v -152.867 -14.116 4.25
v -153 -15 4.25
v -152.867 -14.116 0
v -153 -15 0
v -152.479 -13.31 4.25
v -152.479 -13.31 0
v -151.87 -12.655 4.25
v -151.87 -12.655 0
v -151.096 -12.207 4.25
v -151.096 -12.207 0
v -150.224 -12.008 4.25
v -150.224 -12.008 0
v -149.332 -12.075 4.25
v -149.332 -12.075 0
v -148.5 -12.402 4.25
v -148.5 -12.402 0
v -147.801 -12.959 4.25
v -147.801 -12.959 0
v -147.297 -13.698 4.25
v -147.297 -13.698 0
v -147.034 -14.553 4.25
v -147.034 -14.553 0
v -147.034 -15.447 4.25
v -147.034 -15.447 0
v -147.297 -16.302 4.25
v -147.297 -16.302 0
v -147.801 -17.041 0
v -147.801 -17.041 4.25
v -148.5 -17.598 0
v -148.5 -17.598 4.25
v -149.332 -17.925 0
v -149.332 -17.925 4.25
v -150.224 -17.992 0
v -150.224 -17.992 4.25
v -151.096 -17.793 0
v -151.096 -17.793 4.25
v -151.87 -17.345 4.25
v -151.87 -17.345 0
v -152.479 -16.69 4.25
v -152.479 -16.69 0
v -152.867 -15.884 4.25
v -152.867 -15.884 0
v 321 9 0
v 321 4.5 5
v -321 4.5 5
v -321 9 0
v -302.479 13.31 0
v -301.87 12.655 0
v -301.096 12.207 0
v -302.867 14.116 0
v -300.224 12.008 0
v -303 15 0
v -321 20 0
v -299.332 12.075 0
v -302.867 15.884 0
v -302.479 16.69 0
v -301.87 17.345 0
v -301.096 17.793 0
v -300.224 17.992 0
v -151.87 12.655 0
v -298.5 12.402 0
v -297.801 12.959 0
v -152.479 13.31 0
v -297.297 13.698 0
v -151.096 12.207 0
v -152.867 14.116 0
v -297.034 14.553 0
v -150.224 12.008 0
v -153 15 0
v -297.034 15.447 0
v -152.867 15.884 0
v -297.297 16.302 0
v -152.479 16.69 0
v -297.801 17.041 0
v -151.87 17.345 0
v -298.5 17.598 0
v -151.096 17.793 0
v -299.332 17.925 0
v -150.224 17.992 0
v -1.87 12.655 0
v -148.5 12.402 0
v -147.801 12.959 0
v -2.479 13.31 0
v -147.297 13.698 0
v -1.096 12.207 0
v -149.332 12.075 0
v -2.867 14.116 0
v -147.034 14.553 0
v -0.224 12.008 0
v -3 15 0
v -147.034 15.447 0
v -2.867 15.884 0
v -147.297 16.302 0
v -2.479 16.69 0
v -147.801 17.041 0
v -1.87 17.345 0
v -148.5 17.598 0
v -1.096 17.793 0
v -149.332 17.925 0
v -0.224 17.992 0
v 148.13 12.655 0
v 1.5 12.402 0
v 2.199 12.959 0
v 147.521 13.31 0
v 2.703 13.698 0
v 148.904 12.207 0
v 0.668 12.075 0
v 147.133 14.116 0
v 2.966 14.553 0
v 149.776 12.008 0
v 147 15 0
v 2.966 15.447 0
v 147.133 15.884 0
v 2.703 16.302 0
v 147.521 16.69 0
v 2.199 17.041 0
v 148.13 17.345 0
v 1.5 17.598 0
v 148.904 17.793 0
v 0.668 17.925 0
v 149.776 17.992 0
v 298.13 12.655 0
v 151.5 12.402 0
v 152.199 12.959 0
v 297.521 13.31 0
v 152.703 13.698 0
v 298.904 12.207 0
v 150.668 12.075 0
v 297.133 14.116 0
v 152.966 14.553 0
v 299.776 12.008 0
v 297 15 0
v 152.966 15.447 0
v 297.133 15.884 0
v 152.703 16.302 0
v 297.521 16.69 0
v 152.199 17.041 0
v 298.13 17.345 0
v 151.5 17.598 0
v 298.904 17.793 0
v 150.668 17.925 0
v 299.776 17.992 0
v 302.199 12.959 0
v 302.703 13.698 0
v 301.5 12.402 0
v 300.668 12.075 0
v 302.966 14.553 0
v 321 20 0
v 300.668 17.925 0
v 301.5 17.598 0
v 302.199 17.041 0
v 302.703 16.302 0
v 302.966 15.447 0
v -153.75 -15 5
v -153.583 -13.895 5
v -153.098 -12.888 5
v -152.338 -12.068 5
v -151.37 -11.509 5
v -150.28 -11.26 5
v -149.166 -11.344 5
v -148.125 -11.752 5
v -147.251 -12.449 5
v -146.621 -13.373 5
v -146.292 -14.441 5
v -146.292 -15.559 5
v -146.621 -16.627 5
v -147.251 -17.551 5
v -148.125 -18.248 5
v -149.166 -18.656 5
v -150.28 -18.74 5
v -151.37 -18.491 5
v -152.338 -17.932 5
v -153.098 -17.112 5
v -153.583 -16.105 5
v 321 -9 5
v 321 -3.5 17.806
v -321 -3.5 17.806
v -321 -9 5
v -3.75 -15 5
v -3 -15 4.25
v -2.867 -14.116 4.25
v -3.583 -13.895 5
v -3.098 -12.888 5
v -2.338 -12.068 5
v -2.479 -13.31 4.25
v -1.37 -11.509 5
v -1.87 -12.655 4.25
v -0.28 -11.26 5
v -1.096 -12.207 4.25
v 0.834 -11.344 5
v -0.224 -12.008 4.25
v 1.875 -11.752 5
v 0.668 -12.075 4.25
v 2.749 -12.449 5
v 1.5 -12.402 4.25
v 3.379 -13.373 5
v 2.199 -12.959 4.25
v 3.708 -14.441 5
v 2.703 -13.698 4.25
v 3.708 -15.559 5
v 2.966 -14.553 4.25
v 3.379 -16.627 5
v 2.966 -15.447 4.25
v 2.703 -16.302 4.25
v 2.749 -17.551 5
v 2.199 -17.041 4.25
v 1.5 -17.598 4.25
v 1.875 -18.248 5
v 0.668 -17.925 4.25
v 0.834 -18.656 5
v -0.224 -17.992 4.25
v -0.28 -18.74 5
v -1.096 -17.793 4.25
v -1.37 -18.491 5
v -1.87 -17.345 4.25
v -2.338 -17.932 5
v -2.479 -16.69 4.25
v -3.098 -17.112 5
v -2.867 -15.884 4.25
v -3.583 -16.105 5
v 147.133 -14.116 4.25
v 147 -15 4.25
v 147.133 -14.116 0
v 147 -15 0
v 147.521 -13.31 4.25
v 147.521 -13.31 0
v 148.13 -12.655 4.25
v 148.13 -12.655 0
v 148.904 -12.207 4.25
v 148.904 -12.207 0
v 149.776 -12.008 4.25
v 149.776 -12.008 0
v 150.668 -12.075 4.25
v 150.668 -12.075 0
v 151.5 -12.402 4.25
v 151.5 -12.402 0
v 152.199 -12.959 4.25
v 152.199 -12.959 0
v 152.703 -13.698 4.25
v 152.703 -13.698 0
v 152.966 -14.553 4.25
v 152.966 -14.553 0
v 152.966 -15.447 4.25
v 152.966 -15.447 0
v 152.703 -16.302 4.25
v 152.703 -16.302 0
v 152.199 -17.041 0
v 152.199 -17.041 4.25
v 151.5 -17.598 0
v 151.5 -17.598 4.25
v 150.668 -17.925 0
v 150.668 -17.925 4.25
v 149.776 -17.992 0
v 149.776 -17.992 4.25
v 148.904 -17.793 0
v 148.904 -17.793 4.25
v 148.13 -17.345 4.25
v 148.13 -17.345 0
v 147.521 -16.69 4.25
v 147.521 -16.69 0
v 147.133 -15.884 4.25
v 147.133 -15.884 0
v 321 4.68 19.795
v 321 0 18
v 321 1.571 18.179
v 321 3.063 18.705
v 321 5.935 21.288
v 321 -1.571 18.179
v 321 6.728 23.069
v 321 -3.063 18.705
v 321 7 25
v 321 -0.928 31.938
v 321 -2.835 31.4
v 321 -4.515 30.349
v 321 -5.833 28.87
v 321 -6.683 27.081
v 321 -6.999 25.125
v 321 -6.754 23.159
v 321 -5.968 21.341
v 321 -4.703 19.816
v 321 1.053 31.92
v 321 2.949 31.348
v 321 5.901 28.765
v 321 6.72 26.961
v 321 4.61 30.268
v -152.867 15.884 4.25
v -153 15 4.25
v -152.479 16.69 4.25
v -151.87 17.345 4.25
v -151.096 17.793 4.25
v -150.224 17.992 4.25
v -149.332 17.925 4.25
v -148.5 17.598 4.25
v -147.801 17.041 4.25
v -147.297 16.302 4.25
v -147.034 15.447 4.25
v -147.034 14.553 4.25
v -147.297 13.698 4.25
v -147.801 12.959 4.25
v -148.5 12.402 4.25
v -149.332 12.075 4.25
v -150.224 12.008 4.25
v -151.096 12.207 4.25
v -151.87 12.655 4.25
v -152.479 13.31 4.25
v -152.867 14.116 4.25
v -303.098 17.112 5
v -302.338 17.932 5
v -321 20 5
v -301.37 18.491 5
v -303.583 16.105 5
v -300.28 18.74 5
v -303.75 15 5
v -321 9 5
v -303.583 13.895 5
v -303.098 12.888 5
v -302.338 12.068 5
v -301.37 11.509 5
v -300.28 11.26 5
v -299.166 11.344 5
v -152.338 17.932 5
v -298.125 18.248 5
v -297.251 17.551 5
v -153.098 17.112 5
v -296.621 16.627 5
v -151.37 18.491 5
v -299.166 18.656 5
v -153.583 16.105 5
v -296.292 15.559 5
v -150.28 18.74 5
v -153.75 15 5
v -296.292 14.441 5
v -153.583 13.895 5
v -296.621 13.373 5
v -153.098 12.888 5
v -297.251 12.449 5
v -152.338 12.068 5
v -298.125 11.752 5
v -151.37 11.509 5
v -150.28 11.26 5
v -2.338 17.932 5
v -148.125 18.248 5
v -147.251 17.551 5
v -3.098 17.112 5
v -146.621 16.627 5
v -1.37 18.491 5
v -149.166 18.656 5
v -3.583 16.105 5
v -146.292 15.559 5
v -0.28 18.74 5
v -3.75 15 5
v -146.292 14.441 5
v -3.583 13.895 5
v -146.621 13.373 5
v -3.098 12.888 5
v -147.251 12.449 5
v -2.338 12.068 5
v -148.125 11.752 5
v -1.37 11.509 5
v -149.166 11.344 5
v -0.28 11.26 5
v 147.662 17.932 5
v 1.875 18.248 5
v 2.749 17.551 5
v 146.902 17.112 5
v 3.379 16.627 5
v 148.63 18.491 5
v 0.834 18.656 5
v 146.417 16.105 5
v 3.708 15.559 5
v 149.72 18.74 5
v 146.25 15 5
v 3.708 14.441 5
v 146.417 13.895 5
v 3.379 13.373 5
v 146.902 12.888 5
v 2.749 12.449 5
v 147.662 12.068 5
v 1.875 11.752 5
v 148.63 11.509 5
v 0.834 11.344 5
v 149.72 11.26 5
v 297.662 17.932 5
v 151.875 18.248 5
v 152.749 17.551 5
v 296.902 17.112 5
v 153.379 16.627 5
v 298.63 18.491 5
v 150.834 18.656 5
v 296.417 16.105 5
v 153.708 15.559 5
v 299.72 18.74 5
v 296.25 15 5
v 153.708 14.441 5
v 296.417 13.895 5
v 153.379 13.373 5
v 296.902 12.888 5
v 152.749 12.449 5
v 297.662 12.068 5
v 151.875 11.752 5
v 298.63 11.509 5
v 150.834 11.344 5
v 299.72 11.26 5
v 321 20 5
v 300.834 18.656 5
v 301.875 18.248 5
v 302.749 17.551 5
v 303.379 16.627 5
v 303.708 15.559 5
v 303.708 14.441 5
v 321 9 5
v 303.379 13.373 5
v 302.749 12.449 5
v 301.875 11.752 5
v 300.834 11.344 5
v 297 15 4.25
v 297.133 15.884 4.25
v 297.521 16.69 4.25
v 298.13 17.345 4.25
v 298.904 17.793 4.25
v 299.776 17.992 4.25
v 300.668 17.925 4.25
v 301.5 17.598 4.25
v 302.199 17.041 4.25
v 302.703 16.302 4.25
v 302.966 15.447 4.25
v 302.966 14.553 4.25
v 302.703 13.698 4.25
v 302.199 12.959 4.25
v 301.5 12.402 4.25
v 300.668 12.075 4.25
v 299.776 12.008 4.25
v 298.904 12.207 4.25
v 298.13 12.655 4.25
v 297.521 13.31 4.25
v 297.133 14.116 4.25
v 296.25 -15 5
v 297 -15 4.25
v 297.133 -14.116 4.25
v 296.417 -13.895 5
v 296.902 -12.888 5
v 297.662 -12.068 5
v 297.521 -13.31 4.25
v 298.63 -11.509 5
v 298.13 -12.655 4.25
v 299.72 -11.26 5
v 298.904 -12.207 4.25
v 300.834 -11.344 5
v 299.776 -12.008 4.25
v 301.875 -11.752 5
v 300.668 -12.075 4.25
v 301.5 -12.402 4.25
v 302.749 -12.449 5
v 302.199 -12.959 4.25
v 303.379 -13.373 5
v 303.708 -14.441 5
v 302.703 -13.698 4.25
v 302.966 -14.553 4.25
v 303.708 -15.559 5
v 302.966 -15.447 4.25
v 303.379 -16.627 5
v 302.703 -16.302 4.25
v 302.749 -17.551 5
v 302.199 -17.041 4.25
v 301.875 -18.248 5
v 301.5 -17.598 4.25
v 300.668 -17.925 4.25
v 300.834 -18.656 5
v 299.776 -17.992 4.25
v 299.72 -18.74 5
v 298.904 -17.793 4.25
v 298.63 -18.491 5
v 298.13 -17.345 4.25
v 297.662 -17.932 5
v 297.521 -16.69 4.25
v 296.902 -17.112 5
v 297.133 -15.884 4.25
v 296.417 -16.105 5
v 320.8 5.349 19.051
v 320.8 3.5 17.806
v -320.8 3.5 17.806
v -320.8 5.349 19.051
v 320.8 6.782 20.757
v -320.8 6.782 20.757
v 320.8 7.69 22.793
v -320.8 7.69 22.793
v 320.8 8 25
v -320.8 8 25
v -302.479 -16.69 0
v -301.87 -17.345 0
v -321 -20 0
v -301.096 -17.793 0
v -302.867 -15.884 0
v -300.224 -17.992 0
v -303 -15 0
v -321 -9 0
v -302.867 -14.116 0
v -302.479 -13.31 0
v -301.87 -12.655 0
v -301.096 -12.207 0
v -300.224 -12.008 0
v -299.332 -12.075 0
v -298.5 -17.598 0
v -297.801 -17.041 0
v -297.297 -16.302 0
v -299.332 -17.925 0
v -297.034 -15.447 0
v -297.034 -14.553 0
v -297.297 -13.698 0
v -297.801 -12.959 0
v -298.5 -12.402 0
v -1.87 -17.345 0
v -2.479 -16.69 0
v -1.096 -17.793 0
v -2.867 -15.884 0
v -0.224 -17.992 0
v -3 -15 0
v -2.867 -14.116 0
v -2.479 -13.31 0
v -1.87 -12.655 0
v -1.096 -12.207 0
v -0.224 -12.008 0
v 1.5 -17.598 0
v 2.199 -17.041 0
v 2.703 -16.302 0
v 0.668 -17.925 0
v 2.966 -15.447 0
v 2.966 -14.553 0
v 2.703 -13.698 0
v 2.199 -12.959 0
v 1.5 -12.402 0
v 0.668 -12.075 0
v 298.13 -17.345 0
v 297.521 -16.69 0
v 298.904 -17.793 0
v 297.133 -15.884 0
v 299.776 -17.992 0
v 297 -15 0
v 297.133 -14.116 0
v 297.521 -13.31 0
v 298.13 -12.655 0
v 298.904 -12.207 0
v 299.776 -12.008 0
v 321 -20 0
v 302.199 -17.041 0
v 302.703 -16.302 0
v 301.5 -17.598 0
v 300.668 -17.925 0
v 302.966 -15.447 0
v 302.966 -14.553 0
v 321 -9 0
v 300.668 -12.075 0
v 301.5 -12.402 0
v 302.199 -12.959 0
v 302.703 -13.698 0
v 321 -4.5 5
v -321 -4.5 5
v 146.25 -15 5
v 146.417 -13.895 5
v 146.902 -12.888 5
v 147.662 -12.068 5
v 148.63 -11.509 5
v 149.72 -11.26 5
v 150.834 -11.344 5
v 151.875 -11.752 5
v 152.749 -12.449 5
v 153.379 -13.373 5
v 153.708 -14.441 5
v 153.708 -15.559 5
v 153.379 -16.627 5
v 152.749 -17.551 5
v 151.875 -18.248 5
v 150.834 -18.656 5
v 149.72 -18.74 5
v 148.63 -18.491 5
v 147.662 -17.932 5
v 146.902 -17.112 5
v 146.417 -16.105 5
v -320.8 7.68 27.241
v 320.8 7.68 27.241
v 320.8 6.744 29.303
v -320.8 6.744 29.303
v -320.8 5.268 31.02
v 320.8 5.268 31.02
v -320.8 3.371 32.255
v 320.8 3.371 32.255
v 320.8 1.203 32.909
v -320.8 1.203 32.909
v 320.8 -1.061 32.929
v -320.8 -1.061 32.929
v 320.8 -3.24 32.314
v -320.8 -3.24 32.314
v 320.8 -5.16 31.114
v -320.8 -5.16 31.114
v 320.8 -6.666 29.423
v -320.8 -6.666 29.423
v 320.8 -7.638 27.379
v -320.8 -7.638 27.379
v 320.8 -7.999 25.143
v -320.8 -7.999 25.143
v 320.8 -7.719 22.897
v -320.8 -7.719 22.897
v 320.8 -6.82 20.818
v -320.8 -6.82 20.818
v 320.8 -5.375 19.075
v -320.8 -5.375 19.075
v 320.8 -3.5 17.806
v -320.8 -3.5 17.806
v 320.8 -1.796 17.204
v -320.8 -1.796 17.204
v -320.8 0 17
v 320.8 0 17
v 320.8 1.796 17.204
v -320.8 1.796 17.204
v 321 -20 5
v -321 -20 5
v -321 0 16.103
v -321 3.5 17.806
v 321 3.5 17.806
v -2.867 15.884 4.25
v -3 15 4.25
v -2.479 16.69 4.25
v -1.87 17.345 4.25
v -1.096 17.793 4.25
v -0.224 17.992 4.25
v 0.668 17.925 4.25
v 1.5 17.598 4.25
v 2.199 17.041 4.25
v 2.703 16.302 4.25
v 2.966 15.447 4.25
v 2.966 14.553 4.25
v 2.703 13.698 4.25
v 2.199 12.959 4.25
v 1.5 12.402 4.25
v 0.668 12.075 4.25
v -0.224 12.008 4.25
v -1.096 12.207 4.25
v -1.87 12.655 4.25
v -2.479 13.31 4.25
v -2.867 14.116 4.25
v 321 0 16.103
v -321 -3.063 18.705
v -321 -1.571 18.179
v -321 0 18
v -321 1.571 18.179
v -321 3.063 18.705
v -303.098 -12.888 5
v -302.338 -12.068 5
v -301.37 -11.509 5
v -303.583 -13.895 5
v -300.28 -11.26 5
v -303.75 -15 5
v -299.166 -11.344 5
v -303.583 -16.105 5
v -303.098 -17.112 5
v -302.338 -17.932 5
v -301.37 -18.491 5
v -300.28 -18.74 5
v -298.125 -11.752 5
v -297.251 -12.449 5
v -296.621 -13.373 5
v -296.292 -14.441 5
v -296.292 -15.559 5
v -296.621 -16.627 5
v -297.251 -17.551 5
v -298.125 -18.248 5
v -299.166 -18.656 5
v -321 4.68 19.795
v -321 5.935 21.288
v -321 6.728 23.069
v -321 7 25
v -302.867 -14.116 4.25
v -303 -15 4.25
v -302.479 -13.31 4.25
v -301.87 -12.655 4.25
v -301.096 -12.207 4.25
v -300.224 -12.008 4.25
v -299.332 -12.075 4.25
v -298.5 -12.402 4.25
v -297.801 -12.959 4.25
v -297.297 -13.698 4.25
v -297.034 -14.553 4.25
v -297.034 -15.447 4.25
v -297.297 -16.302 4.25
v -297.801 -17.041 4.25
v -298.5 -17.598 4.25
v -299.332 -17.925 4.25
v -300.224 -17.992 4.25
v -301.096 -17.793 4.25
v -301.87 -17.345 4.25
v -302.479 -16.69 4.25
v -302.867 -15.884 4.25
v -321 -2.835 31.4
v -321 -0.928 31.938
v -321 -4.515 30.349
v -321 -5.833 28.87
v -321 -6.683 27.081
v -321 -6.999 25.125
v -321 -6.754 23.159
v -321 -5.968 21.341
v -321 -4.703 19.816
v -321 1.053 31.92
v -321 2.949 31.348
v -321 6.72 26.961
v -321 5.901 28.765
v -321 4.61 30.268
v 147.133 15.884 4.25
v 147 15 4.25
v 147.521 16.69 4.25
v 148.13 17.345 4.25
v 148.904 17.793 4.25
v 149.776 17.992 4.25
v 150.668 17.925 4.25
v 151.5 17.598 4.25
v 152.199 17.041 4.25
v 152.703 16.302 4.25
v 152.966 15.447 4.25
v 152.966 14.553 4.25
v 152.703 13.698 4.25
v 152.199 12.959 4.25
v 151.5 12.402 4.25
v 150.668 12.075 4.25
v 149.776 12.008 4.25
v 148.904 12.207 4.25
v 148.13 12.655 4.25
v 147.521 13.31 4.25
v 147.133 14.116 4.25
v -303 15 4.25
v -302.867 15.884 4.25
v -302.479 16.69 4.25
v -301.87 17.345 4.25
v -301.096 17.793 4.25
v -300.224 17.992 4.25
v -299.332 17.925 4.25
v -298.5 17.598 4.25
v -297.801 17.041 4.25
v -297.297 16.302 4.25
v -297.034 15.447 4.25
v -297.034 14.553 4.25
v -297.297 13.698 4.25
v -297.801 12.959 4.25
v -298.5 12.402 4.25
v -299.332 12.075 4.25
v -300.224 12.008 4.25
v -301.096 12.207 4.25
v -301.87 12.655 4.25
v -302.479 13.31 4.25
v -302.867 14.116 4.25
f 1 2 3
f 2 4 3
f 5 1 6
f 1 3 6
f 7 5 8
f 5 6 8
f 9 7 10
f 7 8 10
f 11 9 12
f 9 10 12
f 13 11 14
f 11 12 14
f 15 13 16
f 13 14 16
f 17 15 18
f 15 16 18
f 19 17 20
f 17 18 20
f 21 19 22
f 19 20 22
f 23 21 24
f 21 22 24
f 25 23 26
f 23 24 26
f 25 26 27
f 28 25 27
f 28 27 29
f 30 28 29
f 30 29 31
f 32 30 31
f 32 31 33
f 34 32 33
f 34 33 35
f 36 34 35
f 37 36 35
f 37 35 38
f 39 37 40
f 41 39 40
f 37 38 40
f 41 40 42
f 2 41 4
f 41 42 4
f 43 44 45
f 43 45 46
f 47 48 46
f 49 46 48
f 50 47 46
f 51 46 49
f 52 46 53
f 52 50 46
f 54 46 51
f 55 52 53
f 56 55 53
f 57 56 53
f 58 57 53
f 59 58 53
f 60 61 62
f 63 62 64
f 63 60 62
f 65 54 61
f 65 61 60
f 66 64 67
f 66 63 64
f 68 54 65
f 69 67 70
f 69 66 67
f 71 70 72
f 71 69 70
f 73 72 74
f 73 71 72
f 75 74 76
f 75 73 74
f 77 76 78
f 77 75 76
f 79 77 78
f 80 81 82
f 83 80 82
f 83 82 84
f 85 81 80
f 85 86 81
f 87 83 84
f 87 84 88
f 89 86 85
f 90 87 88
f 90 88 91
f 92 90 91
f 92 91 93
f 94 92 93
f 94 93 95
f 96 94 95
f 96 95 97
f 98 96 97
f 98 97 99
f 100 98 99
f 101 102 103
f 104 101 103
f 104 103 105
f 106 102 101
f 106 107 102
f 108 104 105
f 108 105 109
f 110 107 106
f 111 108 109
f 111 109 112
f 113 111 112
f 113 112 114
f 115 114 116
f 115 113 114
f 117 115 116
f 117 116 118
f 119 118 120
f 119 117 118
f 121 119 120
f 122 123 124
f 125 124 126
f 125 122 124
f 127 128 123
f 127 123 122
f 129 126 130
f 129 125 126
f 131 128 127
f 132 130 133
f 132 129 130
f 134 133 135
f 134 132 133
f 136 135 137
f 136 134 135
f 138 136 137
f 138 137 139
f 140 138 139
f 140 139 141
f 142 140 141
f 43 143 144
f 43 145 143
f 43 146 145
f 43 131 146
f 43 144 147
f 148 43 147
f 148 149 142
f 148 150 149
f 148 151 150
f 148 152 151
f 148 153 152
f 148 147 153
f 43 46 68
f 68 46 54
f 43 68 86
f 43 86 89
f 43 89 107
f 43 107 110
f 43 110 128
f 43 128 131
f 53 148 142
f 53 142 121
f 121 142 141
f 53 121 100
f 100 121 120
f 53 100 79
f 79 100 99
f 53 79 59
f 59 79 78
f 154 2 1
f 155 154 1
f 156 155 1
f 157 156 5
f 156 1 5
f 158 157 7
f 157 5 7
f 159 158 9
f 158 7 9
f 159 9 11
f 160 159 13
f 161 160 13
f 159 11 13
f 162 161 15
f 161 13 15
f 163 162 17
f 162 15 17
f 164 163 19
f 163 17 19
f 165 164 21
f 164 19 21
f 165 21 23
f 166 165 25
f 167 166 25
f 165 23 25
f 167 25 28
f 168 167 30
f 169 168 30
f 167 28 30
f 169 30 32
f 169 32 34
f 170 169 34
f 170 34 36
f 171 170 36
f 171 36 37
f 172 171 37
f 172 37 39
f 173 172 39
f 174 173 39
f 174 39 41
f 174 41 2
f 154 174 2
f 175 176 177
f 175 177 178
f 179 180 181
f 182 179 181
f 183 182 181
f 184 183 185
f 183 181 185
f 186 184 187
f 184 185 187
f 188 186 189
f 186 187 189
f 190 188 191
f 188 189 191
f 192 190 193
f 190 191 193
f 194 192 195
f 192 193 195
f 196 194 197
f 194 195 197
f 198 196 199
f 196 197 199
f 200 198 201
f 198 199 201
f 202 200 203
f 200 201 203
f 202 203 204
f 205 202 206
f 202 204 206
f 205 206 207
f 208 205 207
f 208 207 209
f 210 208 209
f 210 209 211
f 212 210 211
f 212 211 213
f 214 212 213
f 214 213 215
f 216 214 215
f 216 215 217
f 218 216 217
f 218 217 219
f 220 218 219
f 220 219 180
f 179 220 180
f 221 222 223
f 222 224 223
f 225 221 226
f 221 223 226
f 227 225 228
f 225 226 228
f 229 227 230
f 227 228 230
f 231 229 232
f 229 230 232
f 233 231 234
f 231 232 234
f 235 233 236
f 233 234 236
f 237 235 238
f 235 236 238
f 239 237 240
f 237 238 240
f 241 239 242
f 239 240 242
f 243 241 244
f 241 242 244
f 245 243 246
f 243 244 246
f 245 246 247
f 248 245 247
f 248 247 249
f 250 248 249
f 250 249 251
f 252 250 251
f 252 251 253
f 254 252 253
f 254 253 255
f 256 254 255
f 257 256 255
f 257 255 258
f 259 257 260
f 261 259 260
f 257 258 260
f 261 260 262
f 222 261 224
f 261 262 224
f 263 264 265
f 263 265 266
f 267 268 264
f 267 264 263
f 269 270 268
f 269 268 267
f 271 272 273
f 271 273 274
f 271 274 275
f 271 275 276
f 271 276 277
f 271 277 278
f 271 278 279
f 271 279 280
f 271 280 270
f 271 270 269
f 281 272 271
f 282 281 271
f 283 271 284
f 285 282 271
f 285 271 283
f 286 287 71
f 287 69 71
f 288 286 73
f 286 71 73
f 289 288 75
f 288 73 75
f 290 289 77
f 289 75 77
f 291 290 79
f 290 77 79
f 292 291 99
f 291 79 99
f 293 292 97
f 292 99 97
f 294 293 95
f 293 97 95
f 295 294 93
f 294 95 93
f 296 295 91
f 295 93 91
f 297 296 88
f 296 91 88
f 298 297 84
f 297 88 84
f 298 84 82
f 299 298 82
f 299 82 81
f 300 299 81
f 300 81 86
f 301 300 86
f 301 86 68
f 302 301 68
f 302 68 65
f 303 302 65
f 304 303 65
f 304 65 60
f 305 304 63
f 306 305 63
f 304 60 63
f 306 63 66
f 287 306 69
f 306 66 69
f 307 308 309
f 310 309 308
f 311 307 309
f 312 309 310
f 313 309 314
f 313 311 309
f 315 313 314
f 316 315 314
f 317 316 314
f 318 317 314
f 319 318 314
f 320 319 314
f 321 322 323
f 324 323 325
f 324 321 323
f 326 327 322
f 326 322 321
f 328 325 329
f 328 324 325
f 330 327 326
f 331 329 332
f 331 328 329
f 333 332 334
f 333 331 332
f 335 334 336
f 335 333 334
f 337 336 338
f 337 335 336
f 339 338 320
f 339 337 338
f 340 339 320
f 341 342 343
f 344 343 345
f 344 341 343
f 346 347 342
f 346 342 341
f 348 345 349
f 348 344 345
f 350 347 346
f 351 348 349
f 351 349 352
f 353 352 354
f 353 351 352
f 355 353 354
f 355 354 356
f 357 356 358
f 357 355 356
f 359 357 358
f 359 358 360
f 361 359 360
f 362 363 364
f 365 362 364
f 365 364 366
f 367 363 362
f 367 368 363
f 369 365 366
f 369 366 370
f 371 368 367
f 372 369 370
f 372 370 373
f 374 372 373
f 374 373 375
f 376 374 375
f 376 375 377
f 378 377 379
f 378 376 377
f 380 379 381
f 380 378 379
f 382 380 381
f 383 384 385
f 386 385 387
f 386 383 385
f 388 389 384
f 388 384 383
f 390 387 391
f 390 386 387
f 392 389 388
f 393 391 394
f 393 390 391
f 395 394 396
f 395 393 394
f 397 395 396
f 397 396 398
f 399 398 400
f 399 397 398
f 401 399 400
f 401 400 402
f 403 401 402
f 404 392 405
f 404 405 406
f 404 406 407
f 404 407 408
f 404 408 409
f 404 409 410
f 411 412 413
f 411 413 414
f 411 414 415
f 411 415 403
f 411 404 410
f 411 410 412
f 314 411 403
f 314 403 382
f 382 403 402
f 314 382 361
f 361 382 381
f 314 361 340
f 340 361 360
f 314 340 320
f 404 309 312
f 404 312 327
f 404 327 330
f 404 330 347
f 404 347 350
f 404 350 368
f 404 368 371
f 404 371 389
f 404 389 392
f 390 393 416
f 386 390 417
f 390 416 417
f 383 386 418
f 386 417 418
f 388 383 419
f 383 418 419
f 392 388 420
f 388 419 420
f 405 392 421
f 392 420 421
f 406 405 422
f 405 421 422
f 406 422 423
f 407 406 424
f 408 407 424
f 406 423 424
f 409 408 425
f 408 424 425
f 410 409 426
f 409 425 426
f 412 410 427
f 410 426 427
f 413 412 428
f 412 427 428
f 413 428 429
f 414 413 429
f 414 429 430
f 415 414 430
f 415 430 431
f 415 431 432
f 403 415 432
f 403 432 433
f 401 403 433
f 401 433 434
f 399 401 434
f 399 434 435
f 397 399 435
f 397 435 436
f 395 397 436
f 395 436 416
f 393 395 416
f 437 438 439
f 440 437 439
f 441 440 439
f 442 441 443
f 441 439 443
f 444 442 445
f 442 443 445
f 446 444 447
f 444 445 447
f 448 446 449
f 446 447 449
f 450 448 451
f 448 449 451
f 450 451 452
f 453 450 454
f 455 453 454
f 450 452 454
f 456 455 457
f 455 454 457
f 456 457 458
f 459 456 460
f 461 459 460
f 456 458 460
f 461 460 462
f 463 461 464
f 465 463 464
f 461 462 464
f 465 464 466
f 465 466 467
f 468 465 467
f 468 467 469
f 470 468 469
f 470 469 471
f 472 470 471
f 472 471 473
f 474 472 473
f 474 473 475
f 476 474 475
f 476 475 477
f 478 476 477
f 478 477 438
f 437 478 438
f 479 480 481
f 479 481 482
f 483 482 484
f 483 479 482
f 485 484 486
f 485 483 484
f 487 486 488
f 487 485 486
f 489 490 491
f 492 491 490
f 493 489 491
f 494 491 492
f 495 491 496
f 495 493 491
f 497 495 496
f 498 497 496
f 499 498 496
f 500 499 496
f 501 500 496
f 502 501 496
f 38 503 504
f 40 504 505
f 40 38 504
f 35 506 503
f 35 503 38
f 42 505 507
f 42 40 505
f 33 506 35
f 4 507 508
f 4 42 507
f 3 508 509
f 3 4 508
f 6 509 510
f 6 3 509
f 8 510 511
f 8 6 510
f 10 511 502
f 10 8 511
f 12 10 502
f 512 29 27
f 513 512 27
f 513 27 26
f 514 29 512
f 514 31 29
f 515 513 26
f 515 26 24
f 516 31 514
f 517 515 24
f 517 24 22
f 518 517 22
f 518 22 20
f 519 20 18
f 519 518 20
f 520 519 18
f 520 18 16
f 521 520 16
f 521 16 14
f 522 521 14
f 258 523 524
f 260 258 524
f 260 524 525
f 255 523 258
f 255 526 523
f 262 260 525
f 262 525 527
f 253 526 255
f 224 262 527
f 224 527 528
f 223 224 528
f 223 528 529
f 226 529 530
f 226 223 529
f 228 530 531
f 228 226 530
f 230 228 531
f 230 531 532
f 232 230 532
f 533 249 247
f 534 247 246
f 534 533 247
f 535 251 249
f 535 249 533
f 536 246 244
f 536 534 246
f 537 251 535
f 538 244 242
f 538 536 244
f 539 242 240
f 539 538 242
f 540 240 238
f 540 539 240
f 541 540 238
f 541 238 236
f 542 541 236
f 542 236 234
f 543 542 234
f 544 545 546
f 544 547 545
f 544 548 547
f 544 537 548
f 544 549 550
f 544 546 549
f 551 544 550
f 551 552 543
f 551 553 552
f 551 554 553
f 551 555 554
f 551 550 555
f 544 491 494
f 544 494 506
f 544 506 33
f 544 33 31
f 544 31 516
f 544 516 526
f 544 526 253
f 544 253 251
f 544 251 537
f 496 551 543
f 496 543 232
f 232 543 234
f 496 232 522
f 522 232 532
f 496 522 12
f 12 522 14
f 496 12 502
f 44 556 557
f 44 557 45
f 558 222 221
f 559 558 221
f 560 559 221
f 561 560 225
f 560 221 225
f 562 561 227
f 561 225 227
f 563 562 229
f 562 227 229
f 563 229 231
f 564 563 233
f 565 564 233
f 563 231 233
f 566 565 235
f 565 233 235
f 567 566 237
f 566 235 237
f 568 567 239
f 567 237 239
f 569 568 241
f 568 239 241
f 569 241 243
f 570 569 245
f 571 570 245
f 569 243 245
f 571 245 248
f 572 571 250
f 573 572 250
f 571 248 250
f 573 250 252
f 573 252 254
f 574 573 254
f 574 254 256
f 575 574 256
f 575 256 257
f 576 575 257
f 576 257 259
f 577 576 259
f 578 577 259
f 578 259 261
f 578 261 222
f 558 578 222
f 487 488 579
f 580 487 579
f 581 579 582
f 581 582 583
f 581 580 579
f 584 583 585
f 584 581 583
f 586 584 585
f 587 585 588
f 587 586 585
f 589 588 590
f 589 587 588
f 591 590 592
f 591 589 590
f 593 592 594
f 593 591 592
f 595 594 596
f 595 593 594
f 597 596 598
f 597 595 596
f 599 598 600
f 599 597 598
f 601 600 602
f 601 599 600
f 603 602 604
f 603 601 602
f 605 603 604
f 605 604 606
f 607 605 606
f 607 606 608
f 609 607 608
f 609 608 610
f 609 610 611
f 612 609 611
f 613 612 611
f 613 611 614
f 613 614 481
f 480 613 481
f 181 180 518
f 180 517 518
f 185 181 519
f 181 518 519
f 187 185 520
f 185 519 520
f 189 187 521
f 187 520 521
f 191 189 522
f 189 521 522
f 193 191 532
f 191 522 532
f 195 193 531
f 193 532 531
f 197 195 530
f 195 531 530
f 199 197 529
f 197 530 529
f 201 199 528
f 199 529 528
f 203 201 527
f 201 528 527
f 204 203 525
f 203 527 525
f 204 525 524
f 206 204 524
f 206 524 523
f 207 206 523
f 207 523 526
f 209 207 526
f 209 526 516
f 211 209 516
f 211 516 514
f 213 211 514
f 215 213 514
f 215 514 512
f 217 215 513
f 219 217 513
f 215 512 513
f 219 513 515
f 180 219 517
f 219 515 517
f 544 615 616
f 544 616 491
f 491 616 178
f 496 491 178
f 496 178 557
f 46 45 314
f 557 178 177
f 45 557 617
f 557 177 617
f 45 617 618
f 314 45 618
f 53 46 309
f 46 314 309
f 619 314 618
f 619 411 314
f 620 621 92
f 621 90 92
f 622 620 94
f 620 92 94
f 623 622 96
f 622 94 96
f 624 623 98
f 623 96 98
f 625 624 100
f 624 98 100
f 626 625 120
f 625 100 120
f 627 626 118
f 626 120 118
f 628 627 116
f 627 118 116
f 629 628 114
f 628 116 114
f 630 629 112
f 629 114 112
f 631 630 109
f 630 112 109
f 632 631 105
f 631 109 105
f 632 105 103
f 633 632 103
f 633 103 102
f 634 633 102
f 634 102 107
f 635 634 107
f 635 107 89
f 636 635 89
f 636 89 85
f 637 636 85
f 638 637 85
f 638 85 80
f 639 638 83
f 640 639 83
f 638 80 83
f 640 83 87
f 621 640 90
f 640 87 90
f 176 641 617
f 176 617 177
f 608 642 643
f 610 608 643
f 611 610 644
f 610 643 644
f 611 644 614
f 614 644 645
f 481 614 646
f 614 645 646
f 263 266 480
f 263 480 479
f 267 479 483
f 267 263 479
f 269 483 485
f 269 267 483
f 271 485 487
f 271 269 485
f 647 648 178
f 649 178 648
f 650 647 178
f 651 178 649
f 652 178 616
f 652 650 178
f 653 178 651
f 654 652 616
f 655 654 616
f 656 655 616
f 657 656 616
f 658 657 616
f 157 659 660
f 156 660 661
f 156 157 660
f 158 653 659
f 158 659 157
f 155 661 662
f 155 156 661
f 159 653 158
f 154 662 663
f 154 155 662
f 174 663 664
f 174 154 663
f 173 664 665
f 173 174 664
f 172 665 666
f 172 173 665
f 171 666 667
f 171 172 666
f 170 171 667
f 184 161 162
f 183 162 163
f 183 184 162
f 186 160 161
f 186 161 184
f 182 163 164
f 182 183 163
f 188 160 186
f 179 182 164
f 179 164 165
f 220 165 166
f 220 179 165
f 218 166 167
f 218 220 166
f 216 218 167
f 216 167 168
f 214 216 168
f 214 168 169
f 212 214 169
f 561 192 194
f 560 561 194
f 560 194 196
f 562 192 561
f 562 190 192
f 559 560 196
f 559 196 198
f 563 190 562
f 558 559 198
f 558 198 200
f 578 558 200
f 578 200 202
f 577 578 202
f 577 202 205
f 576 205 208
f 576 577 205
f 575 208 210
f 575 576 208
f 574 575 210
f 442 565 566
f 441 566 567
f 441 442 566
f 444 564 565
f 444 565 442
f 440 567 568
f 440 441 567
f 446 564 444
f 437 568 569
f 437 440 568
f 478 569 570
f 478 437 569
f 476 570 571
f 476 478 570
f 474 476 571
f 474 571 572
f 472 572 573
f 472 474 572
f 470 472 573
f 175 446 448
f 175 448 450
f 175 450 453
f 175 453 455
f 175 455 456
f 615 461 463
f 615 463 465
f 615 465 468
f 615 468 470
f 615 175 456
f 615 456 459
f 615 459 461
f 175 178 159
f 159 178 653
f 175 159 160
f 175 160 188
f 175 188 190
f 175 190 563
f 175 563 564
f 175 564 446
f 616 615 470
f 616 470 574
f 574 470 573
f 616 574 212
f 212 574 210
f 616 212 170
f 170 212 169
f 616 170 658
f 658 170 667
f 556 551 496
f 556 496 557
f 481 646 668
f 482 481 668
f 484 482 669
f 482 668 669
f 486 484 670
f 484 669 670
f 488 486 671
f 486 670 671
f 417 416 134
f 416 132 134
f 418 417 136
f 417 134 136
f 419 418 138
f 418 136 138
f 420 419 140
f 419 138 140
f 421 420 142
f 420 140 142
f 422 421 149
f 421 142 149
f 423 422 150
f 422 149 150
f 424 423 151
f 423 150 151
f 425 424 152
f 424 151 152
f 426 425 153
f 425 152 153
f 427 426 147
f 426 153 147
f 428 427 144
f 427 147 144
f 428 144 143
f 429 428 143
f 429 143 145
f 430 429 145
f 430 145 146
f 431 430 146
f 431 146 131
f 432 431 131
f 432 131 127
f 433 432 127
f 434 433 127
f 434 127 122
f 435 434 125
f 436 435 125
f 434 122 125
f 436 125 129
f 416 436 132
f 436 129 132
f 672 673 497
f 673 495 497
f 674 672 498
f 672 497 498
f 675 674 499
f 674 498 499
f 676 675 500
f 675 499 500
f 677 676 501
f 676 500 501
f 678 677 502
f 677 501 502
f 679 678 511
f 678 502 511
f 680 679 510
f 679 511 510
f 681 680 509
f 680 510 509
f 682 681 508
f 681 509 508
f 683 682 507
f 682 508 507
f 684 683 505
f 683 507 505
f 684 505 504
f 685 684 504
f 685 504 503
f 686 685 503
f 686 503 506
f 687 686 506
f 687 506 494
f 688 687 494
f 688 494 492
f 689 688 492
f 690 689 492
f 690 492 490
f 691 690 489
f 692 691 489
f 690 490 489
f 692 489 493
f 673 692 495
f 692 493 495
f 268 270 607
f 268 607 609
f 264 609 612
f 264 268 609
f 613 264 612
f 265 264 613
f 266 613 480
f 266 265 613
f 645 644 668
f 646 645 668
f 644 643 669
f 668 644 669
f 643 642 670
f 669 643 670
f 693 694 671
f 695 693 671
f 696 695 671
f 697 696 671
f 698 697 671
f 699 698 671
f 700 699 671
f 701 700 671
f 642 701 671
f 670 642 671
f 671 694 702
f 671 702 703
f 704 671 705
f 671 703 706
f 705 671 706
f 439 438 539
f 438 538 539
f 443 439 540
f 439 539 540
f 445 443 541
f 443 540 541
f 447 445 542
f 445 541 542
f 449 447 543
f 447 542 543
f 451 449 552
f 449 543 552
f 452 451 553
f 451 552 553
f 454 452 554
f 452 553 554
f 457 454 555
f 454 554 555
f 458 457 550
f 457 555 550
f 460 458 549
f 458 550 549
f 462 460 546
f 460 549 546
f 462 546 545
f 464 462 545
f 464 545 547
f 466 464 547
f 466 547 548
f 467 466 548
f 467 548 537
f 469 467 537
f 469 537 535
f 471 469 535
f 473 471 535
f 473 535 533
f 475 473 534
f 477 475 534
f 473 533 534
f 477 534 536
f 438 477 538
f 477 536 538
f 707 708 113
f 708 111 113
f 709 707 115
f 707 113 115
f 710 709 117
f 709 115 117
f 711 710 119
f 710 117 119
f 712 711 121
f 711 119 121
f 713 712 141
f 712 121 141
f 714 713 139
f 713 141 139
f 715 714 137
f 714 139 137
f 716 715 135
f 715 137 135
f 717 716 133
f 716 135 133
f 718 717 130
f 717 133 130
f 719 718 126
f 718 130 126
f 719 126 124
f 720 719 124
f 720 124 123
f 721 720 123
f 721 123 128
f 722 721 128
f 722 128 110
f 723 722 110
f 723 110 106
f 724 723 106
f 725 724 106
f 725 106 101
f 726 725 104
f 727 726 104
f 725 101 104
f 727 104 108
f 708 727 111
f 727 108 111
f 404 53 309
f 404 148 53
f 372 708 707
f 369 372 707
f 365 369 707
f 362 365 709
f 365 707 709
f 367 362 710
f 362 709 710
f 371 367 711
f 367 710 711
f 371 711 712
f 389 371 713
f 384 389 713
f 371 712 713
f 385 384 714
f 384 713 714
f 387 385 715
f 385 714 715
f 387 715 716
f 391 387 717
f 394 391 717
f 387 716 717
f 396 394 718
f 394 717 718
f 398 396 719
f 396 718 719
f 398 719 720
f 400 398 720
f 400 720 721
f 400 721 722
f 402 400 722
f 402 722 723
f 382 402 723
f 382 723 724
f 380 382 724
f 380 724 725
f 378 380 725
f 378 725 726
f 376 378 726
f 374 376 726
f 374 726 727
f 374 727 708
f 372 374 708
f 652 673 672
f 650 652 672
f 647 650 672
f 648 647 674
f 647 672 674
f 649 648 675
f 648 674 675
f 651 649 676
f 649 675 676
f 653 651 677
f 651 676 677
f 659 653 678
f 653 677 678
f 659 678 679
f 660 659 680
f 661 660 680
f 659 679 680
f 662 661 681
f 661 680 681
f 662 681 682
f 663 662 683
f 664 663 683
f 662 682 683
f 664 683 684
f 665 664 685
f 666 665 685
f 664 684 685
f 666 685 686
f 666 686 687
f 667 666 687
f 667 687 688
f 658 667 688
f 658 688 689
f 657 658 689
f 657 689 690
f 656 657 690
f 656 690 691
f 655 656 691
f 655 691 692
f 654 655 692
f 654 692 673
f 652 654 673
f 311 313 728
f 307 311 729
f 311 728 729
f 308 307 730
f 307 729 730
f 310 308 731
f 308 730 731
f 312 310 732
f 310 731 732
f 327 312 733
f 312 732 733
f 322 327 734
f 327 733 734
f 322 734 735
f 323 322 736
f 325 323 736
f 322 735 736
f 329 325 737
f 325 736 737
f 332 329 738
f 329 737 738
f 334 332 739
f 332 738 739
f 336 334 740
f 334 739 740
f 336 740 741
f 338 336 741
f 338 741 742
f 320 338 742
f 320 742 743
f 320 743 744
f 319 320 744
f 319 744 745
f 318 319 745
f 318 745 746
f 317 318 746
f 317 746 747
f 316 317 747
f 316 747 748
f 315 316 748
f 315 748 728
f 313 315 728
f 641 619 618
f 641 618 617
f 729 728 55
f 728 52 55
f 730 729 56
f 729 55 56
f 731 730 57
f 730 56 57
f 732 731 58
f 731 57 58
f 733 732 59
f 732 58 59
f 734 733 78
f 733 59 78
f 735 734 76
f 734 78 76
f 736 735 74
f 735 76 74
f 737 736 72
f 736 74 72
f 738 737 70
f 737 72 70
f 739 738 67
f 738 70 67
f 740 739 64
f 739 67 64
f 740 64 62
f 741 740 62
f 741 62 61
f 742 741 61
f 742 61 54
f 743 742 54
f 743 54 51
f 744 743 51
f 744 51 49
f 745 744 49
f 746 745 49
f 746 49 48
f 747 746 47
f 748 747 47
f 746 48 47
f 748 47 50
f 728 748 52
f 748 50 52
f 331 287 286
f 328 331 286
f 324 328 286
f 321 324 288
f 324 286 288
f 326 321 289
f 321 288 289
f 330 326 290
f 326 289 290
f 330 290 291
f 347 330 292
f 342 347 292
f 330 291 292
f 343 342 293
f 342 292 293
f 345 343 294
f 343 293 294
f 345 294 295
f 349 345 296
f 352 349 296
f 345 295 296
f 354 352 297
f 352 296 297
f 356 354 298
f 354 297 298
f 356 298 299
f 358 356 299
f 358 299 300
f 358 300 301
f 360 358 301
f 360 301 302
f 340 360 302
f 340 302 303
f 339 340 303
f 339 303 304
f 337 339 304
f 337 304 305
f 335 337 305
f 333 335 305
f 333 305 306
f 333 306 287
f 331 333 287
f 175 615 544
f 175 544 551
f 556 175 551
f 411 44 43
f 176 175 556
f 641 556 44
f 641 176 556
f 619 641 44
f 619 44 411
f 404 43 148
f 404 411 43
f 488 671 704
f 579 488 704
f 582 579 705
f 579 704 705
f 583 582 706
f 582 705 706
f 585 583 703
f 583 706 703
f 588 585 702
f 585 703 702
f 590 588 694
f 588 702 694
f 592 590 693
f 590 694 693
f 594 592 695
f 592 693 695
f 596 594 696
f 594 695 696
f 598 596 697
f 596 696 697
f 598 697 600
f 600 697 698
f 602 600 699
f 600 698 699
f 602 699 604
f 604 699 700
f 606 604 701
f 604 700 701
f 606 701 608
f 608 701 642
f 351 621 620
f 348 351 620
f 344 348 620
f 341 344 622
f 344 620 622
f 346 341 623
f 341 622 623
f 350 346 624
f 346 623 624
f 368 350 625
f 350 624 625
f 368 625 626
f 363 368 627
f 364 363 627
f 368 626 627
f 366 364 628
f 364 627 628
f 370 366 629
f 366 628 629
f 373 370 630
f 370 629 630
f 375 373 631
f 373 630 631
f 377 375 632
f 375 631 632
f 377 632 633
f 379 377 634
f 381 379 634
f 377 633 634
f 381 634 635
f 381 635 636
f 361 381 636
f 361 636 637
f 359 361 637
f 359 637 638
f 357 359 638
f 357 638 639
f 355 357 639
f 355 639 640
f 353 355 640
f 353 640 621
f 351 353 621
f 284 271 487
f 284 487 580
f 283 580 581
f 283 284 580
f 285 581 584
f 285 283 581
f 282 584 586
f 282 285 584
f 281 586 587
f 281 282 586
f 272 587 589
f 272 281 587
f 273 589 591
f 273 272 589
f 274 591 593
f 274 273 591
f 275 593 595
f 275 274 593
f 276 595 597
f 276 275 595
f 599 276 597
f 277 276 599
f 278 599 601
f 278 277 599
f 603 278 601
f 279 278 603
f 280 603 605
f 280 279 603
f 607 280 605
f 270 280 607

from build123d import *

# Parameters (mm, degrees)
F1_DEPTH       = 321
F2_DEPTH       = 321
F4_D           = 6
F4_CSINK_D     = 7.5
F4_CSINK_ANGLE = 90
F5_SIZE2       = 1
F5_SIZE        = 0.2
F5_2_SIZE2     = 1
F5_2_SIZE      = 0.2


with BuildPart() as f1:
    # F0 (on Right) → F1 (new body, symmetric)
    with BuildSketch(Plane.YZ):
        Polygon((9, 5), (3.5, 17.806252715), (0, 16.1033850002), (0, 5), (4.5, 5), (9, 0), (20, 0), (20, 5), align=None)
        Polygon((0, 16.1033850002), (-3.5, 17.806252715), (-9, 5), (-20, 5), (-20, 0), (-9, 0), (-4.5, 5), (0, 5), align=None)
    extrude(amount=F1_DEPTH, both=True)

    # F4 (through all)
    with Locations(Plane.XY.offset(5)):
        with Locations((-150, 15), (-300, 15), (0, 15), (0, -15), (-300, -15), (-150, -15), (150, -15), (300, 15), (150, 15), (300, -15)):
            CounterSinkHole(F4_D / 2, F4_CSINK_D / 2, counter_sink_angle=F4_CSINK_ANGLE)


with BuildPart() as f2:
    # F0 (on Right) → F2 (new body, symmetric)
    with BuildSketch(Plane.YZ):
        with BuildLine():
            ThreePointArc((3.5, 17.806252715), (6.7823299831, 20.7573593129), (8, 25))
            ThreePointArc((8, 25), (-4.2426406871, 31.7823299831), (-3.5, 17.806252715))
            ThreePointArc((-3.5, 17.806252715), (0, 17), (3.5, 17.806252715))
        make_face()
    extrude(amount=F2_DEPTH, both=True)

    # F5
    f5_edges = [f2.edges().sort_by_distance(p)[0] for p in [
        (-321, -4.242641, 31.78233),
    ]]
    f5_side = f2.faces().sort_by_distance((-160.5, -4.242641, 31.78233))[0]
    chamfer(f5_edges, length=F5_SIZE, length2=F5_SIZE2, reference=f5_side)

    # F5#2
    f5_2_edges = [f2.edges().sort_by_distance(p)[0] for p in [
        (321, -4.242641, 31.78233),
    ]]
    f5_2_side = f2.faces().sort_by_distance((160.5, -4.242641, 31.78233))[0]
    chamfer(f5_2_edges, length=F5_2_SIZE, length2=F5_2_SIZE2, reference=f5_2_side)


solid = Compound([f1.part, f2.part])
